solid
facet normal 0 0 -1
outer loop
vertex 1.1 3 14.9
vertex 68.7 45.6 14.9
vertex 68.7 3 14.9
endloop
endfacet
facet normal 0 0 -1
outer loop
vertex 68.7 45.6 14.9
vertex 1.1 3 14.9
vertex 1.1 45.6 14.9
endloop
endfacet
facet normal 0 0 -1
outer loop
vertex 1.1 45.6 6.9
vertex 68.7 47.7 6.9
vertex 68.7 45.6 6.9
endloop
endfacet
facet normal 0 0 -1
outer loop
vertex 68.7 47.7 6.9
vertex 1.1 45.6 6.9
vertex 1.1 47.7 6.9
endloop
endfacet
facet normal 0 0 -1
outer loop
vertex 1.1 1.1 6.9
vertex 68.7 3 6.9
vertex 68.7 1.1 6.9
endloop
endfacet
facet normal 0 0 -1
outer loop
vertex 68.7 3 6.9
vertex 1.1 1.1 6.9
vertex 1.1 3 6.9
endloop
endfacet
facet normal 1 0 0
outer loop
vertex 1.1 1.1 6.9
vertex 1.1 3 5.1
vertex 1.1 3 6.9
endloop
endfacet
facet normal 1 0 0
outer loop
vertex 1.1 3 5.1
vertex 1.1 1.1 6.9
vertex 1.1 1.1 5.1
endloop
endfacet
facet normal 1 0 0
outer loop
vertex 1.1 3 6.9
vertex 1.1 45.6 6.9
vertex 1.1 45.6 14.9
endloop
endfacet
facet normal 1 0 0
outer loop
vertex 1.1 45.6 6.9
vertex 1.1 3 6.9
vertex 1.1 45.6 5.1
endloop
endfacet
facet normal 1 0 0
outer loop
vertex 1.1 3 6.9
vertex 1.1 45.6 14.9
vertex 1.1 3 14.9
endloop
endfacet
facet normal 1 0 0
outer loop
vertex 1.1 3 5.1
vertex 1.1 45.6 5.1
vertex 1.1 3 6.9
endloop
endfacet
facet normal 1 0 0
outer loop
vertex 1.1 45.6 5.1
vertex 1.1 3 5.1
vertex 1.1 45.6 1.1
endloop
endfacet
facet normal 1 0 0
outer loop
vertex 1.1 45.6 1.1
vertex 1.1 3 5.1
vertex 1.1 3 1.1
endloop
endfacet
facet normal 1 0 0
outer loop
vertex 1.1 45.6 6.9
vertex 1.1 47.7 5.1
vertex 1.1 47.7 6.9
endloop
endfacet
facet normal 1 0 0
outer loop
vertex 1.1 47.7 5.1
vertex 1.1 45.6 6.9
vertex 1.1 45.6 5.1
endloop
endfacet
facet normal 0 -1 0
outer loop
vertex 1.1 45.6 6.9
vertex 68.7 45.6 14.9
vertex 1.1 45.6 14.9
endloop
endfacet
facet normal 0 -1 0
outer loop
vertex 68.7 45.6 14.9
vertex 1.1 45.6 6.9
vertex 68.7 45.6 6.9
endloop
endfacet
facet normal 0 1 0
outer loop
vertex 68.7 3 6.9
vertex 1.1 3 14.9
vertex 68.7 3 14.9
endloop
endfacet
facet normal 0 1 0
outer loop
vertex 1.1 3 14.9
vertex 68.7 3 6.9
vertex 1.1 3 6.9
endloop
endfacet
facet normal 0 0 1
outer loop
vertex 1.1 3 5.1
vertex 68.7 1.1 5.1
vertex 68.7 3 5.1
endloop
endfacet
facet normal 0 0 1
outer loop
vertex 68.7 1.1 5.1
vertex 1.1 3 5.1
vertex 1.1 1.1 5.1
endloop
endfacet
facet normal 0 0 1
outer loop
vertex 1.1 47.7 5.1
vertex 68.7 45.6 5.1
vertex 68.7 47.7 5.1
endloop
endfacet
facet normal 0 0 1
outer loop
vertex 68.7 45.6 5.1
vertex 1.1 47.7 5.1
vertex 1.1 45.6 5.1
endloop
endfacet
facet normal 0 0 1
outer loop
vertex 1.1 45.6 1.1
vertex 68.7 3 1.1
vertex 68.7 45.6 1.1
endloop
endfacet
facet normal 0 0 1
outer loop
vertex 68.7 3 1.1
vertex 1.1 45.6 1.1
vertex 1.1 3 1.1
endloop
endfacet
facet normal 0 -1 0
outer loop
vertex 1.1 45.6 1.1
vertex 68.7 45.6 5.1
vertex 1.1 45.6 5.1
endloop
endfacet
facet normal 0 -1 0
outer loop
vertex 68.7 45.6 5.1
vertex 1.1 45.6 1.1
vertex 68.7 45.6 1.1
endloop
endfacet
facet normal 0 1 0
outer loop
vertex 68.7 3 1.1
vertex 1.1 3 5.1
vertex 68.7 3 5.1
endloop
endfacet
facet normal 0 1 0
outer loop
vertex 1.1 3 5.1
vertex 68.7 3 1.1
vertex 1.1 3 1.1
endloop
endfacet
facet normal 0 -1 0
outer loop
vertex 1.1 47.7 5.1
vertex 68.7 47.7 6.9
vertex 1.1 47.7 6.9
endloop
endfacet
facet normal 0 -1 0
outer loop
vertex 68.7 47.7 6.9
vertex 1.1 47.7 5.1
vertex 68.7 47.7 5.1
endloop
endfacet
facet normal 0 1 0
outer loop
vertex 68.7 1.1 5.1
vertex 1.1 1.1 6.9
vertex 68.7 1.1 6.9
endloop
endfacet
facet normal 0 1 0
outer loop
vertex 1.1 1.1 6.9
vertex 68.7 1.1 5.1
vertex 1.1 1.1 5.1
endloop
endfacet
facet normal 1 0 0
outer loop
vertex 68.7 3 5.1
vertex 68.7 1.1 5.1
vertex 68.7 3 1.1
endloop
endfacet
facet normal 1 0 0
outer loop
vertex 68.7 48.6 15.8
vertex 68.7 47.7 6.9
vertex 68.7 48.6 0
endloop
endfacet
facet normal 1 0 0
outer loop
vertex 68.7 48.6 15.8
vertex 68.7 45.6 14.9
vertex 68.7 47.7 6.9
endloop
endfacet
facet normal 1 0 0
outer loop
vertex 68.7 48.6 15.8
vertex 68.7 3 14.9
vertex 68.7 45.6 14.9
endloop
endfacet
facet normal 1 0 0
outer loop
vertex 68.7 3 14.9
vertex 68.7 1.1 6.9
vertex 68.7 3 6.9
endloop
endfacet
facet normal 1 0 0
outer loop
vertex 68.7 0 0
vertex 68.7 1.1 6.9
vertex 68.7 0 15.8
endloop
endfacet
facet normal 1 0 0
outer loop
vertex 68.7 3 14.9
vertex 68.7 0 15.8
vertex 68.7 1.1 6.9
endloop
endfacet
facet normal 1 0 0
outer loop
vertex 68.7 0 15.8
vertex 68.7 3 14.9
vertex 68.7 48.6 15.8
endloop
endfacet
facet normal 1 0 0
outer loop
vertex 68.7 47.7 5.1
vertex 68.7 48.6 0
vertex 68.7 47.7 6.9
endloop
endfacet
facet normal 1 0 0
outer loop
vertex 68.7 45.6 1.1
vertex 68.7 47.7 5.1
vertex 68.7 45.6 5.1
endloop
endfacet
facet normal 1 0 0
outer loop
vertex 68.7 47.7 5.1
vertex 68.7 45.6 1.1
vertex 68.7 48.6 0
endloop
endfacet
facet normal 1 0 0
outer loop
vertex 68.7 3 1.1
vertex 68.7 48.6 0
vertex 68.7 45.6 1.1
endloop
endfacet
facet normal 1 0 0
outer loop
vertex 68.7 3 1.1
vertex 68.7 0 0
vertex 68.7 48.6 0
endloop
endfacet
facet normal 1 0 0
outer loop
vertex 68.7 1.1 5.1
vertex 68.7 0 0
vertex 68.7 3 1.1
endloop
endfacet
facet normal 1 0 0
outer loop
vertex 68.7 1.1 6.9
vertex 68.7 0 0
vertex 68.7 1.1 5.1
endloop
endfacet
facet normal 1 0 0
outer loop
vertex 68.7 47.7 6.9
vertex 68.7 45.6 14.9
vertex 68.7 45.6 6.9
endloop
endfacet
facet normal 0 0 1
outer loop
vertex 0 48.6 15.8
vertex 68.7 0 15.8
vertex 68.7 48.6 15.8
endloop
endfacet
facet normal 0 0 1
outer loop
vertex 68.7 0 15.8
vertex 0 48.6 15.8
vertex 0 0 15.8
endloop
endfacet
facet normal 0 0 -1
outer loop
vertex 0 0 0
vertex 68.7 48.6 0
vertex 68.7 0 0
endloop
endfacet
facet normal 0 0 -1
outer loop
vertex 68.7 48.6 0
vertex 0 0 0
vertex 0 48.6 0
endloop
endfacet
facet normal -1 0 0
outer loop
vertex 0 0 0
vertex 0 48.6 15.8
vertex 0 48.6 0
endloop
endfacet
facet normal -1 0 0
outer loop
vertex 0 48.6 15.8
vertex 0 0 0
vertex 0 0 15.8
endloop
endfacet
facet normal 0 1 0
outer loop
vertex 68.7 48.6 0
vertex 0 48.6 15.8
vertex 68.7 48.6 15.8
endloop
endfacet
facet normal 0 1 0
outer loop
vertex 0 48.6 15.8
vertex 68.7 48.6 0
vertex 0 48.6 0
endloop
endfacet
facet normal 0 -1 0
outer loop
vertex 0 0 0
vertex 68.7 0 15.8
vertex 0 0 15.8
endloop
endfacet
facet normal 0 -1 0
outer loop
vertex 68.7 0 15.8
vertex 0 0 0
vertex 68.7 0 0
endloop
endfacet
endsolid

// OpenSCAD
$fn = 60;

e_m = 0.1;      //3D-printing error margin

//circuit board
cb_w = 66.5;    //circuit board width
cb_d = 46.4;    //circuit board depth
cb_h = 1.6;     //circuit board height

//circuit board placement
//cb_p_h = 4;   //height
cb_p_s_d = 2;   //sloth depth
cb_b_s = 0;     // back slot yes(1) or no(0)
//circuit board height needs to be changed by the circuit board height

//component opening
cb_p_h_t = 8;   //height top
cb_p_h_b = 4;   //height bottom

//casing
c_t = 1;        //Case thick
c_w = 68.7;//c_t*2+e_m*2+cb_w;       //case width
c_d = 48.6;//c_t*2+e_m*2+cb_d;       //case depth
c_h = c_t*2+e_m*2+cb_h+cb_p_h_b+cb_p_h_t;       //case height
echo(c_w); //68.7
echo(c_d); //48.6
echo(c_h); //22.8
//Case height needs to be changed by the circuit board height

circuit_holder();

module circuit_holder(){
    difference(){
        cube([c_w, c_d, c_h]);
        pcb_no_go_zone();
    }
}

module pcb_no_go_zone(){
    union(){
        union(){
            if ( cb_b_s == 1){
                translate([(c_w-cb_w)+c_t-e_m*2+e_m,c_t+cb_p_s_d,(cb_p_h_b+e_m + c_t)+cb_h+e_m*2])
                cube([(cb_w+e_m*2)-cb_p_s_d + c_t, (cb_d+e_m*2)-cb_p_s_d*2, cb_p_h_t]);
                translate([(c_w-cb_w)+c_t-e_m*2+e_m,c_t+cb_p_s_d,(cb_p_h_b+e_m + c_t) - cb_p_h_b])
                cube([(cb_w+e_m*2)-cb_p_s_d+ c_t, (cb_d+e_m*2)-cb_p_s_d*2, cb_p_h_b]);
            }
            else{
                translate([(c_w-cb_w)-c_t-e_m*2+e_m,c_t+cb_p_s_d,(cb_p_h_b+e_m+c_t)+cb_h+e_m*2])
                cube([(cb_w+e_m*2)+ c_t, (cb_d+e_m*2)-cb_p_s_d*2, cb_p_h_t]);
                translate([(c_w-cb_w)-c_t-e_m*2+e_m,c_t+cb_p_s_d,(cb_p_h_b+e_m+c_t) - cb_p_h_b])
                cube([(cb_w+e_m*2)+ c_t, (cb_d+e_m*2)-cb_p_s_d*2, cb_p_h_b]);
            }
        }
        translate([(c_w-cb_w)-c_t-e_m*2+e_m,c_t+e_m,cb_p_h_b+e_m+c_t])
        cube([cb_w+e_m*2+ c_t, cb_d+e_m*2, cb_h+e_m*2]);
    }
}
